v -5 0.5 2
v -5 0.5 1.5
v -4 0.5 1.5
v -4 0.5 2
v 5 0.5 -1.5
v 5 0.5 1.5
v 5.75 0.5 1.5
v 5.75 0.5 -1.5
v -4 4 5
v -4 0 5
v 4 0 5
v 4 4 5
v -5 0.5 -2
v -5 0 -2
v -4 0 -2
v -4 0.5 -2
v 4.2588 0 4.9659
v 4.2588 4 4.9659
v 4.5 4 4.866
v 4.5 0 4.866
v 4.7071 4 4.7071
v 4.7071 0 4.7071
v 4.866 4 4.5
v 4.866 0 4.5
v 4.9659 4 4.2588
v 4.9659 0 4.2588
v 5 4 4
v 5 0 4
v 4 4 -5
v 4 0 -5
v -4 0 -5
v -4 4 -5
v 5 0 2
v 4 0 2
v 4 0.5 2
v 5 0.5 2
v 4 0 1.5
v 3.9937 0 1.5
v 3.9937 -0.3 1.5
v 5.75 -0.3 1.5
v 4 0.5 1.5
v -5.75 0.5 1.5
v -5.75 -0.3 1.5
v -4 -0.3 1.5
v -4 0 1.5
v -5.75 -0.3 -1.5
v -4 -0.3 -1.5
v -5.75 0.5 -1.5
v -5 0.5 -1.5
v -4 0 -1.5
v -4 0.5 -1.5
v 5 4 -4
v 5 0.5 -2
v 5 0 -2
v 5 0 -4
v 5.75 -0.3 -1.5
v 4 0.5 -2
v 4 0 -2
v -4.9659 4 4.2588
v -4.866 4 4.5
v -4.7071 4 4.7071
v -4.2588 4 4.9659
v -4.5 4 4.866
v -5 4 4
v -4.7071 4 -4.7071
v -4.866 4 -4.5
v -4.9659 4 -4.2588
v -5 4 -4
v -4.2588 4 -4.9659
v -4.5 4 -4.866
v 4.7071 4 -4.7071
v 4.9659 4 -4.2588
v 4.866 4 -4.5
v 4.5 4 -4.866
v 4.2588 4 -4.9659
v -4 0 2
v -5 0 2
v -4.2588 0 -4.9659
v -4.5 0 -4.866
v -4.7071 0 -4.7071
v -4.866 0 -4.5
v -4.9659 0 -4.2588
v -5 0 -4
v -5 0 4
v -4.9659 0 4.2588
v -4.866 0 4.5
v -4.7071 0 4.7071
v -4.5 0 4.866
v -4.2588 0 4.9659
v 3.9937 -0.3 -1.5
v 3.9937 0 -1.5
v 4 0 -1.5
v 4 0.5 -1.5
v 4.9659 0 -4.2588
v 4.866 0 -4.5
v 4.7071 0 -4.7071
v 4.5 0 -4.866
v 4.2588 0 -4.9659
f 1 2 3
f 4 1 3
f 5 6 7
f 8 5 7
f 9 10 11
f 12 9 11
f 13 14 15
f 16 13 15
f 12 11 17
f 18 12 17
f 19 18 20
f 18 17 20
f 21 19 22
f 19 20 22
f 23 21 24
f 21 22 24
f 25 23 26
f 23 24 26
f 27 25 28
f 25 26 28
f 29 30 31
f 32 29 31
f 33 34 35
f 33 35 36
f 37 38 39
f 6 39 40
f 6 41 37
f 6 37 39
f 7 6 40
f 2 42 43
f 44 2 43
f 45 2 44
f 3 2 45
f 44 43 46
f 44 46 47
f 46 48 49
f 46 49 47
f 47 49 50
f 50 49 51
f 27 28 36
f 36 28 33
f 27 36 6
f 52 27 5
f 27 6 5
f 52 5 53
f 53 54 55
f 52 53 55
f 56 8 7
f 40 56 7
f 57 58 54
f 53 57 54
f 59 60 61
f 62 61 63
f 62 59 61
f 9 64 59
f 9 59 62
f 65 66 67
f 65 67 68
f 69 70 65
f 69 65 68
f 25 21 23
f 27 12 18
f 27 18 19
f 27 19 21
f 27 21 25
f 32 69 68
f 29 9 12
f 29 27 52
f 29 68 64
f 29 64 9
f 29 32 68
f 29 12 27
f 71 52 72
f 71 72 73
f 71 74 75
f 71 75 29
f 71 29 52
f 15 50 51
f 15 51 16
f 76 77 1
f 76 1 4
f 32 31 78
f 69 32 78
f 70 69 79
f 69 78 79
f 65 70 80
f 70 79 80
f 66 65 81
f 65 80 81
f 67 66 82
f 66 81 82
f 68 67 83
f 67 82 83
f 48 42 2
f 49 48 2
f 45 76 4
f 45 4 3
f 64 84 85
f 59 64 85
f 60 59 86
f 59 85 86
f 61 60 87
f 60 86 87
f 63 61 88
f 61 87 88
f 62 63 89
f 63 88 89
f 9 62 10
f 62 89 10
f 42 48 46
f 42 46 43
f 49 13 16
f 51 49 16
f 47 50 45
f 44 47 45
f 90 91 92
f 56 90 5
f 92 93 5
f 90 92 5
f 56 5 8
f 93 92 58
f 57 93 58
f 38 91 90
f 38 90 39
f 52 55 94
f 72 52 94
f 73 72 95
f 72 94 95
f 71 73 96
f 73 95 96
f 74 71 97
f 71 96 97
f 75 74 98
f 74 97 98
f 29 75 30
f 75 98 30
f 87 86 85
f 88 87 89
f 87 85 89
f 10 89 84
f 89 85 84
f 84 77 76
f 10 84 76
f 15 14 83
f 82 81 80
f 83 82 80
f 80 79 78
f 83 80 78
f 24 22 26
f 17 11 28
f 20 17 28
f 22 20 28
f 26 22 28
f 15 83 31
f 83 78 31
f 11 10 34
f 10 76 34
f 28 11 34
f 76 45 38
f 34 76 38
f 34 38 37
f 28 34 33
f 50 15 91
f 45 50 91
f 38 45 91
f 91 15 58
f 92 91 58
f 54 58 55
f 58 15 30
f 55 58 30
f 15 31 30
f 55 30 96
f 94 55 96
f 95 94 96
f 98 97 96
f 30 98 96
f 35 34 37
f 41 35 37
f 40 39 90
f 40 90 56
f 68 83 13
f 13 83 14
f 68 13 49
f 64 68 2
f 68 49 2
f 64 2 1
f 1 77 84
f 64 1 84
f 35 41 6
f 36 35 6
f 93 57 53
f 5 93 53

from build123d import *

# Parameters (mm, degrees)
BOSS_EXTRUDE1_DEPTH = 4
SKETCH2_W           = 2
SKETCH2_H           = 4
CUT_EXTRUDE1_DEPTH  = 0.5
SKETCH3_W           = 1.75
SKETCH3_H           = 3
SKETCH3_W_2         = 1.75632414
BOSS_EXTRUDE2_DEPTH = 0.8


with BuildPart() as part:
    # Sketch1 → Boss-Extrude1 (new body)
    with BuildSketch(Plane(origin=(0, 0, 0), x_dir=(1, 0, 0), z_dir=(0, 1, 0))):
        with BuildLine():
            Line((-4, -5), (4, -5))
            ThreePointArc((4, -5), (4.707106781, -4.707106781), (5, -4))
            Line((5, -4), (5, 4))
            ThreePointArc((5, 4), (4.707106781, 4.707106781), (4, 5))
            Line((4, 5), (-4, 5))
            ThreePointArc((-4, 5), (-4.707106781, 4.707106781), (-5, 4))
            Line((-5, 4), (-5, -4))
            ThreePointArc((-5, -4), (-4.707106781, -4.707106781), (-4, -5))
        make_face()
    extrude(amount=BOSS_EXTRUDE1_DEPTH)

    # Sketch2 → Cut-Extrude1 (cut)
    with BuildSketch(Plane(origin=(0, 0, 0), x_dir=(1, 0, 0), z_dir=(0, 1, 0))):
        with Locations((-5, 0)):
            Rectangle(SKETCH2_W, SKETCH2_H)
        with Locations((5, 0)):
            Rectangle(SKETCH2_W, SKETCH2_H)
    extrude(amount=CUT_EXTRUDE1_DEPTH, mode=Mode.SUBTRACT)

    # Sketch3 → Boss-Extrude2 (add)
    with BuildSketch(Plane.XZ.offset(-0.5)):
        with Locations((-4.875, 0)):
            Rectangle(SKETCH3_W, SKETCH3_H)
        with Locations((4.87183793, 0)):
            Rectangle(SKETCH3_W_2, SKETCH3_H)
    extrude(amount=BOSS_EXTRUDE2_DEPTH)


solid = part.part
